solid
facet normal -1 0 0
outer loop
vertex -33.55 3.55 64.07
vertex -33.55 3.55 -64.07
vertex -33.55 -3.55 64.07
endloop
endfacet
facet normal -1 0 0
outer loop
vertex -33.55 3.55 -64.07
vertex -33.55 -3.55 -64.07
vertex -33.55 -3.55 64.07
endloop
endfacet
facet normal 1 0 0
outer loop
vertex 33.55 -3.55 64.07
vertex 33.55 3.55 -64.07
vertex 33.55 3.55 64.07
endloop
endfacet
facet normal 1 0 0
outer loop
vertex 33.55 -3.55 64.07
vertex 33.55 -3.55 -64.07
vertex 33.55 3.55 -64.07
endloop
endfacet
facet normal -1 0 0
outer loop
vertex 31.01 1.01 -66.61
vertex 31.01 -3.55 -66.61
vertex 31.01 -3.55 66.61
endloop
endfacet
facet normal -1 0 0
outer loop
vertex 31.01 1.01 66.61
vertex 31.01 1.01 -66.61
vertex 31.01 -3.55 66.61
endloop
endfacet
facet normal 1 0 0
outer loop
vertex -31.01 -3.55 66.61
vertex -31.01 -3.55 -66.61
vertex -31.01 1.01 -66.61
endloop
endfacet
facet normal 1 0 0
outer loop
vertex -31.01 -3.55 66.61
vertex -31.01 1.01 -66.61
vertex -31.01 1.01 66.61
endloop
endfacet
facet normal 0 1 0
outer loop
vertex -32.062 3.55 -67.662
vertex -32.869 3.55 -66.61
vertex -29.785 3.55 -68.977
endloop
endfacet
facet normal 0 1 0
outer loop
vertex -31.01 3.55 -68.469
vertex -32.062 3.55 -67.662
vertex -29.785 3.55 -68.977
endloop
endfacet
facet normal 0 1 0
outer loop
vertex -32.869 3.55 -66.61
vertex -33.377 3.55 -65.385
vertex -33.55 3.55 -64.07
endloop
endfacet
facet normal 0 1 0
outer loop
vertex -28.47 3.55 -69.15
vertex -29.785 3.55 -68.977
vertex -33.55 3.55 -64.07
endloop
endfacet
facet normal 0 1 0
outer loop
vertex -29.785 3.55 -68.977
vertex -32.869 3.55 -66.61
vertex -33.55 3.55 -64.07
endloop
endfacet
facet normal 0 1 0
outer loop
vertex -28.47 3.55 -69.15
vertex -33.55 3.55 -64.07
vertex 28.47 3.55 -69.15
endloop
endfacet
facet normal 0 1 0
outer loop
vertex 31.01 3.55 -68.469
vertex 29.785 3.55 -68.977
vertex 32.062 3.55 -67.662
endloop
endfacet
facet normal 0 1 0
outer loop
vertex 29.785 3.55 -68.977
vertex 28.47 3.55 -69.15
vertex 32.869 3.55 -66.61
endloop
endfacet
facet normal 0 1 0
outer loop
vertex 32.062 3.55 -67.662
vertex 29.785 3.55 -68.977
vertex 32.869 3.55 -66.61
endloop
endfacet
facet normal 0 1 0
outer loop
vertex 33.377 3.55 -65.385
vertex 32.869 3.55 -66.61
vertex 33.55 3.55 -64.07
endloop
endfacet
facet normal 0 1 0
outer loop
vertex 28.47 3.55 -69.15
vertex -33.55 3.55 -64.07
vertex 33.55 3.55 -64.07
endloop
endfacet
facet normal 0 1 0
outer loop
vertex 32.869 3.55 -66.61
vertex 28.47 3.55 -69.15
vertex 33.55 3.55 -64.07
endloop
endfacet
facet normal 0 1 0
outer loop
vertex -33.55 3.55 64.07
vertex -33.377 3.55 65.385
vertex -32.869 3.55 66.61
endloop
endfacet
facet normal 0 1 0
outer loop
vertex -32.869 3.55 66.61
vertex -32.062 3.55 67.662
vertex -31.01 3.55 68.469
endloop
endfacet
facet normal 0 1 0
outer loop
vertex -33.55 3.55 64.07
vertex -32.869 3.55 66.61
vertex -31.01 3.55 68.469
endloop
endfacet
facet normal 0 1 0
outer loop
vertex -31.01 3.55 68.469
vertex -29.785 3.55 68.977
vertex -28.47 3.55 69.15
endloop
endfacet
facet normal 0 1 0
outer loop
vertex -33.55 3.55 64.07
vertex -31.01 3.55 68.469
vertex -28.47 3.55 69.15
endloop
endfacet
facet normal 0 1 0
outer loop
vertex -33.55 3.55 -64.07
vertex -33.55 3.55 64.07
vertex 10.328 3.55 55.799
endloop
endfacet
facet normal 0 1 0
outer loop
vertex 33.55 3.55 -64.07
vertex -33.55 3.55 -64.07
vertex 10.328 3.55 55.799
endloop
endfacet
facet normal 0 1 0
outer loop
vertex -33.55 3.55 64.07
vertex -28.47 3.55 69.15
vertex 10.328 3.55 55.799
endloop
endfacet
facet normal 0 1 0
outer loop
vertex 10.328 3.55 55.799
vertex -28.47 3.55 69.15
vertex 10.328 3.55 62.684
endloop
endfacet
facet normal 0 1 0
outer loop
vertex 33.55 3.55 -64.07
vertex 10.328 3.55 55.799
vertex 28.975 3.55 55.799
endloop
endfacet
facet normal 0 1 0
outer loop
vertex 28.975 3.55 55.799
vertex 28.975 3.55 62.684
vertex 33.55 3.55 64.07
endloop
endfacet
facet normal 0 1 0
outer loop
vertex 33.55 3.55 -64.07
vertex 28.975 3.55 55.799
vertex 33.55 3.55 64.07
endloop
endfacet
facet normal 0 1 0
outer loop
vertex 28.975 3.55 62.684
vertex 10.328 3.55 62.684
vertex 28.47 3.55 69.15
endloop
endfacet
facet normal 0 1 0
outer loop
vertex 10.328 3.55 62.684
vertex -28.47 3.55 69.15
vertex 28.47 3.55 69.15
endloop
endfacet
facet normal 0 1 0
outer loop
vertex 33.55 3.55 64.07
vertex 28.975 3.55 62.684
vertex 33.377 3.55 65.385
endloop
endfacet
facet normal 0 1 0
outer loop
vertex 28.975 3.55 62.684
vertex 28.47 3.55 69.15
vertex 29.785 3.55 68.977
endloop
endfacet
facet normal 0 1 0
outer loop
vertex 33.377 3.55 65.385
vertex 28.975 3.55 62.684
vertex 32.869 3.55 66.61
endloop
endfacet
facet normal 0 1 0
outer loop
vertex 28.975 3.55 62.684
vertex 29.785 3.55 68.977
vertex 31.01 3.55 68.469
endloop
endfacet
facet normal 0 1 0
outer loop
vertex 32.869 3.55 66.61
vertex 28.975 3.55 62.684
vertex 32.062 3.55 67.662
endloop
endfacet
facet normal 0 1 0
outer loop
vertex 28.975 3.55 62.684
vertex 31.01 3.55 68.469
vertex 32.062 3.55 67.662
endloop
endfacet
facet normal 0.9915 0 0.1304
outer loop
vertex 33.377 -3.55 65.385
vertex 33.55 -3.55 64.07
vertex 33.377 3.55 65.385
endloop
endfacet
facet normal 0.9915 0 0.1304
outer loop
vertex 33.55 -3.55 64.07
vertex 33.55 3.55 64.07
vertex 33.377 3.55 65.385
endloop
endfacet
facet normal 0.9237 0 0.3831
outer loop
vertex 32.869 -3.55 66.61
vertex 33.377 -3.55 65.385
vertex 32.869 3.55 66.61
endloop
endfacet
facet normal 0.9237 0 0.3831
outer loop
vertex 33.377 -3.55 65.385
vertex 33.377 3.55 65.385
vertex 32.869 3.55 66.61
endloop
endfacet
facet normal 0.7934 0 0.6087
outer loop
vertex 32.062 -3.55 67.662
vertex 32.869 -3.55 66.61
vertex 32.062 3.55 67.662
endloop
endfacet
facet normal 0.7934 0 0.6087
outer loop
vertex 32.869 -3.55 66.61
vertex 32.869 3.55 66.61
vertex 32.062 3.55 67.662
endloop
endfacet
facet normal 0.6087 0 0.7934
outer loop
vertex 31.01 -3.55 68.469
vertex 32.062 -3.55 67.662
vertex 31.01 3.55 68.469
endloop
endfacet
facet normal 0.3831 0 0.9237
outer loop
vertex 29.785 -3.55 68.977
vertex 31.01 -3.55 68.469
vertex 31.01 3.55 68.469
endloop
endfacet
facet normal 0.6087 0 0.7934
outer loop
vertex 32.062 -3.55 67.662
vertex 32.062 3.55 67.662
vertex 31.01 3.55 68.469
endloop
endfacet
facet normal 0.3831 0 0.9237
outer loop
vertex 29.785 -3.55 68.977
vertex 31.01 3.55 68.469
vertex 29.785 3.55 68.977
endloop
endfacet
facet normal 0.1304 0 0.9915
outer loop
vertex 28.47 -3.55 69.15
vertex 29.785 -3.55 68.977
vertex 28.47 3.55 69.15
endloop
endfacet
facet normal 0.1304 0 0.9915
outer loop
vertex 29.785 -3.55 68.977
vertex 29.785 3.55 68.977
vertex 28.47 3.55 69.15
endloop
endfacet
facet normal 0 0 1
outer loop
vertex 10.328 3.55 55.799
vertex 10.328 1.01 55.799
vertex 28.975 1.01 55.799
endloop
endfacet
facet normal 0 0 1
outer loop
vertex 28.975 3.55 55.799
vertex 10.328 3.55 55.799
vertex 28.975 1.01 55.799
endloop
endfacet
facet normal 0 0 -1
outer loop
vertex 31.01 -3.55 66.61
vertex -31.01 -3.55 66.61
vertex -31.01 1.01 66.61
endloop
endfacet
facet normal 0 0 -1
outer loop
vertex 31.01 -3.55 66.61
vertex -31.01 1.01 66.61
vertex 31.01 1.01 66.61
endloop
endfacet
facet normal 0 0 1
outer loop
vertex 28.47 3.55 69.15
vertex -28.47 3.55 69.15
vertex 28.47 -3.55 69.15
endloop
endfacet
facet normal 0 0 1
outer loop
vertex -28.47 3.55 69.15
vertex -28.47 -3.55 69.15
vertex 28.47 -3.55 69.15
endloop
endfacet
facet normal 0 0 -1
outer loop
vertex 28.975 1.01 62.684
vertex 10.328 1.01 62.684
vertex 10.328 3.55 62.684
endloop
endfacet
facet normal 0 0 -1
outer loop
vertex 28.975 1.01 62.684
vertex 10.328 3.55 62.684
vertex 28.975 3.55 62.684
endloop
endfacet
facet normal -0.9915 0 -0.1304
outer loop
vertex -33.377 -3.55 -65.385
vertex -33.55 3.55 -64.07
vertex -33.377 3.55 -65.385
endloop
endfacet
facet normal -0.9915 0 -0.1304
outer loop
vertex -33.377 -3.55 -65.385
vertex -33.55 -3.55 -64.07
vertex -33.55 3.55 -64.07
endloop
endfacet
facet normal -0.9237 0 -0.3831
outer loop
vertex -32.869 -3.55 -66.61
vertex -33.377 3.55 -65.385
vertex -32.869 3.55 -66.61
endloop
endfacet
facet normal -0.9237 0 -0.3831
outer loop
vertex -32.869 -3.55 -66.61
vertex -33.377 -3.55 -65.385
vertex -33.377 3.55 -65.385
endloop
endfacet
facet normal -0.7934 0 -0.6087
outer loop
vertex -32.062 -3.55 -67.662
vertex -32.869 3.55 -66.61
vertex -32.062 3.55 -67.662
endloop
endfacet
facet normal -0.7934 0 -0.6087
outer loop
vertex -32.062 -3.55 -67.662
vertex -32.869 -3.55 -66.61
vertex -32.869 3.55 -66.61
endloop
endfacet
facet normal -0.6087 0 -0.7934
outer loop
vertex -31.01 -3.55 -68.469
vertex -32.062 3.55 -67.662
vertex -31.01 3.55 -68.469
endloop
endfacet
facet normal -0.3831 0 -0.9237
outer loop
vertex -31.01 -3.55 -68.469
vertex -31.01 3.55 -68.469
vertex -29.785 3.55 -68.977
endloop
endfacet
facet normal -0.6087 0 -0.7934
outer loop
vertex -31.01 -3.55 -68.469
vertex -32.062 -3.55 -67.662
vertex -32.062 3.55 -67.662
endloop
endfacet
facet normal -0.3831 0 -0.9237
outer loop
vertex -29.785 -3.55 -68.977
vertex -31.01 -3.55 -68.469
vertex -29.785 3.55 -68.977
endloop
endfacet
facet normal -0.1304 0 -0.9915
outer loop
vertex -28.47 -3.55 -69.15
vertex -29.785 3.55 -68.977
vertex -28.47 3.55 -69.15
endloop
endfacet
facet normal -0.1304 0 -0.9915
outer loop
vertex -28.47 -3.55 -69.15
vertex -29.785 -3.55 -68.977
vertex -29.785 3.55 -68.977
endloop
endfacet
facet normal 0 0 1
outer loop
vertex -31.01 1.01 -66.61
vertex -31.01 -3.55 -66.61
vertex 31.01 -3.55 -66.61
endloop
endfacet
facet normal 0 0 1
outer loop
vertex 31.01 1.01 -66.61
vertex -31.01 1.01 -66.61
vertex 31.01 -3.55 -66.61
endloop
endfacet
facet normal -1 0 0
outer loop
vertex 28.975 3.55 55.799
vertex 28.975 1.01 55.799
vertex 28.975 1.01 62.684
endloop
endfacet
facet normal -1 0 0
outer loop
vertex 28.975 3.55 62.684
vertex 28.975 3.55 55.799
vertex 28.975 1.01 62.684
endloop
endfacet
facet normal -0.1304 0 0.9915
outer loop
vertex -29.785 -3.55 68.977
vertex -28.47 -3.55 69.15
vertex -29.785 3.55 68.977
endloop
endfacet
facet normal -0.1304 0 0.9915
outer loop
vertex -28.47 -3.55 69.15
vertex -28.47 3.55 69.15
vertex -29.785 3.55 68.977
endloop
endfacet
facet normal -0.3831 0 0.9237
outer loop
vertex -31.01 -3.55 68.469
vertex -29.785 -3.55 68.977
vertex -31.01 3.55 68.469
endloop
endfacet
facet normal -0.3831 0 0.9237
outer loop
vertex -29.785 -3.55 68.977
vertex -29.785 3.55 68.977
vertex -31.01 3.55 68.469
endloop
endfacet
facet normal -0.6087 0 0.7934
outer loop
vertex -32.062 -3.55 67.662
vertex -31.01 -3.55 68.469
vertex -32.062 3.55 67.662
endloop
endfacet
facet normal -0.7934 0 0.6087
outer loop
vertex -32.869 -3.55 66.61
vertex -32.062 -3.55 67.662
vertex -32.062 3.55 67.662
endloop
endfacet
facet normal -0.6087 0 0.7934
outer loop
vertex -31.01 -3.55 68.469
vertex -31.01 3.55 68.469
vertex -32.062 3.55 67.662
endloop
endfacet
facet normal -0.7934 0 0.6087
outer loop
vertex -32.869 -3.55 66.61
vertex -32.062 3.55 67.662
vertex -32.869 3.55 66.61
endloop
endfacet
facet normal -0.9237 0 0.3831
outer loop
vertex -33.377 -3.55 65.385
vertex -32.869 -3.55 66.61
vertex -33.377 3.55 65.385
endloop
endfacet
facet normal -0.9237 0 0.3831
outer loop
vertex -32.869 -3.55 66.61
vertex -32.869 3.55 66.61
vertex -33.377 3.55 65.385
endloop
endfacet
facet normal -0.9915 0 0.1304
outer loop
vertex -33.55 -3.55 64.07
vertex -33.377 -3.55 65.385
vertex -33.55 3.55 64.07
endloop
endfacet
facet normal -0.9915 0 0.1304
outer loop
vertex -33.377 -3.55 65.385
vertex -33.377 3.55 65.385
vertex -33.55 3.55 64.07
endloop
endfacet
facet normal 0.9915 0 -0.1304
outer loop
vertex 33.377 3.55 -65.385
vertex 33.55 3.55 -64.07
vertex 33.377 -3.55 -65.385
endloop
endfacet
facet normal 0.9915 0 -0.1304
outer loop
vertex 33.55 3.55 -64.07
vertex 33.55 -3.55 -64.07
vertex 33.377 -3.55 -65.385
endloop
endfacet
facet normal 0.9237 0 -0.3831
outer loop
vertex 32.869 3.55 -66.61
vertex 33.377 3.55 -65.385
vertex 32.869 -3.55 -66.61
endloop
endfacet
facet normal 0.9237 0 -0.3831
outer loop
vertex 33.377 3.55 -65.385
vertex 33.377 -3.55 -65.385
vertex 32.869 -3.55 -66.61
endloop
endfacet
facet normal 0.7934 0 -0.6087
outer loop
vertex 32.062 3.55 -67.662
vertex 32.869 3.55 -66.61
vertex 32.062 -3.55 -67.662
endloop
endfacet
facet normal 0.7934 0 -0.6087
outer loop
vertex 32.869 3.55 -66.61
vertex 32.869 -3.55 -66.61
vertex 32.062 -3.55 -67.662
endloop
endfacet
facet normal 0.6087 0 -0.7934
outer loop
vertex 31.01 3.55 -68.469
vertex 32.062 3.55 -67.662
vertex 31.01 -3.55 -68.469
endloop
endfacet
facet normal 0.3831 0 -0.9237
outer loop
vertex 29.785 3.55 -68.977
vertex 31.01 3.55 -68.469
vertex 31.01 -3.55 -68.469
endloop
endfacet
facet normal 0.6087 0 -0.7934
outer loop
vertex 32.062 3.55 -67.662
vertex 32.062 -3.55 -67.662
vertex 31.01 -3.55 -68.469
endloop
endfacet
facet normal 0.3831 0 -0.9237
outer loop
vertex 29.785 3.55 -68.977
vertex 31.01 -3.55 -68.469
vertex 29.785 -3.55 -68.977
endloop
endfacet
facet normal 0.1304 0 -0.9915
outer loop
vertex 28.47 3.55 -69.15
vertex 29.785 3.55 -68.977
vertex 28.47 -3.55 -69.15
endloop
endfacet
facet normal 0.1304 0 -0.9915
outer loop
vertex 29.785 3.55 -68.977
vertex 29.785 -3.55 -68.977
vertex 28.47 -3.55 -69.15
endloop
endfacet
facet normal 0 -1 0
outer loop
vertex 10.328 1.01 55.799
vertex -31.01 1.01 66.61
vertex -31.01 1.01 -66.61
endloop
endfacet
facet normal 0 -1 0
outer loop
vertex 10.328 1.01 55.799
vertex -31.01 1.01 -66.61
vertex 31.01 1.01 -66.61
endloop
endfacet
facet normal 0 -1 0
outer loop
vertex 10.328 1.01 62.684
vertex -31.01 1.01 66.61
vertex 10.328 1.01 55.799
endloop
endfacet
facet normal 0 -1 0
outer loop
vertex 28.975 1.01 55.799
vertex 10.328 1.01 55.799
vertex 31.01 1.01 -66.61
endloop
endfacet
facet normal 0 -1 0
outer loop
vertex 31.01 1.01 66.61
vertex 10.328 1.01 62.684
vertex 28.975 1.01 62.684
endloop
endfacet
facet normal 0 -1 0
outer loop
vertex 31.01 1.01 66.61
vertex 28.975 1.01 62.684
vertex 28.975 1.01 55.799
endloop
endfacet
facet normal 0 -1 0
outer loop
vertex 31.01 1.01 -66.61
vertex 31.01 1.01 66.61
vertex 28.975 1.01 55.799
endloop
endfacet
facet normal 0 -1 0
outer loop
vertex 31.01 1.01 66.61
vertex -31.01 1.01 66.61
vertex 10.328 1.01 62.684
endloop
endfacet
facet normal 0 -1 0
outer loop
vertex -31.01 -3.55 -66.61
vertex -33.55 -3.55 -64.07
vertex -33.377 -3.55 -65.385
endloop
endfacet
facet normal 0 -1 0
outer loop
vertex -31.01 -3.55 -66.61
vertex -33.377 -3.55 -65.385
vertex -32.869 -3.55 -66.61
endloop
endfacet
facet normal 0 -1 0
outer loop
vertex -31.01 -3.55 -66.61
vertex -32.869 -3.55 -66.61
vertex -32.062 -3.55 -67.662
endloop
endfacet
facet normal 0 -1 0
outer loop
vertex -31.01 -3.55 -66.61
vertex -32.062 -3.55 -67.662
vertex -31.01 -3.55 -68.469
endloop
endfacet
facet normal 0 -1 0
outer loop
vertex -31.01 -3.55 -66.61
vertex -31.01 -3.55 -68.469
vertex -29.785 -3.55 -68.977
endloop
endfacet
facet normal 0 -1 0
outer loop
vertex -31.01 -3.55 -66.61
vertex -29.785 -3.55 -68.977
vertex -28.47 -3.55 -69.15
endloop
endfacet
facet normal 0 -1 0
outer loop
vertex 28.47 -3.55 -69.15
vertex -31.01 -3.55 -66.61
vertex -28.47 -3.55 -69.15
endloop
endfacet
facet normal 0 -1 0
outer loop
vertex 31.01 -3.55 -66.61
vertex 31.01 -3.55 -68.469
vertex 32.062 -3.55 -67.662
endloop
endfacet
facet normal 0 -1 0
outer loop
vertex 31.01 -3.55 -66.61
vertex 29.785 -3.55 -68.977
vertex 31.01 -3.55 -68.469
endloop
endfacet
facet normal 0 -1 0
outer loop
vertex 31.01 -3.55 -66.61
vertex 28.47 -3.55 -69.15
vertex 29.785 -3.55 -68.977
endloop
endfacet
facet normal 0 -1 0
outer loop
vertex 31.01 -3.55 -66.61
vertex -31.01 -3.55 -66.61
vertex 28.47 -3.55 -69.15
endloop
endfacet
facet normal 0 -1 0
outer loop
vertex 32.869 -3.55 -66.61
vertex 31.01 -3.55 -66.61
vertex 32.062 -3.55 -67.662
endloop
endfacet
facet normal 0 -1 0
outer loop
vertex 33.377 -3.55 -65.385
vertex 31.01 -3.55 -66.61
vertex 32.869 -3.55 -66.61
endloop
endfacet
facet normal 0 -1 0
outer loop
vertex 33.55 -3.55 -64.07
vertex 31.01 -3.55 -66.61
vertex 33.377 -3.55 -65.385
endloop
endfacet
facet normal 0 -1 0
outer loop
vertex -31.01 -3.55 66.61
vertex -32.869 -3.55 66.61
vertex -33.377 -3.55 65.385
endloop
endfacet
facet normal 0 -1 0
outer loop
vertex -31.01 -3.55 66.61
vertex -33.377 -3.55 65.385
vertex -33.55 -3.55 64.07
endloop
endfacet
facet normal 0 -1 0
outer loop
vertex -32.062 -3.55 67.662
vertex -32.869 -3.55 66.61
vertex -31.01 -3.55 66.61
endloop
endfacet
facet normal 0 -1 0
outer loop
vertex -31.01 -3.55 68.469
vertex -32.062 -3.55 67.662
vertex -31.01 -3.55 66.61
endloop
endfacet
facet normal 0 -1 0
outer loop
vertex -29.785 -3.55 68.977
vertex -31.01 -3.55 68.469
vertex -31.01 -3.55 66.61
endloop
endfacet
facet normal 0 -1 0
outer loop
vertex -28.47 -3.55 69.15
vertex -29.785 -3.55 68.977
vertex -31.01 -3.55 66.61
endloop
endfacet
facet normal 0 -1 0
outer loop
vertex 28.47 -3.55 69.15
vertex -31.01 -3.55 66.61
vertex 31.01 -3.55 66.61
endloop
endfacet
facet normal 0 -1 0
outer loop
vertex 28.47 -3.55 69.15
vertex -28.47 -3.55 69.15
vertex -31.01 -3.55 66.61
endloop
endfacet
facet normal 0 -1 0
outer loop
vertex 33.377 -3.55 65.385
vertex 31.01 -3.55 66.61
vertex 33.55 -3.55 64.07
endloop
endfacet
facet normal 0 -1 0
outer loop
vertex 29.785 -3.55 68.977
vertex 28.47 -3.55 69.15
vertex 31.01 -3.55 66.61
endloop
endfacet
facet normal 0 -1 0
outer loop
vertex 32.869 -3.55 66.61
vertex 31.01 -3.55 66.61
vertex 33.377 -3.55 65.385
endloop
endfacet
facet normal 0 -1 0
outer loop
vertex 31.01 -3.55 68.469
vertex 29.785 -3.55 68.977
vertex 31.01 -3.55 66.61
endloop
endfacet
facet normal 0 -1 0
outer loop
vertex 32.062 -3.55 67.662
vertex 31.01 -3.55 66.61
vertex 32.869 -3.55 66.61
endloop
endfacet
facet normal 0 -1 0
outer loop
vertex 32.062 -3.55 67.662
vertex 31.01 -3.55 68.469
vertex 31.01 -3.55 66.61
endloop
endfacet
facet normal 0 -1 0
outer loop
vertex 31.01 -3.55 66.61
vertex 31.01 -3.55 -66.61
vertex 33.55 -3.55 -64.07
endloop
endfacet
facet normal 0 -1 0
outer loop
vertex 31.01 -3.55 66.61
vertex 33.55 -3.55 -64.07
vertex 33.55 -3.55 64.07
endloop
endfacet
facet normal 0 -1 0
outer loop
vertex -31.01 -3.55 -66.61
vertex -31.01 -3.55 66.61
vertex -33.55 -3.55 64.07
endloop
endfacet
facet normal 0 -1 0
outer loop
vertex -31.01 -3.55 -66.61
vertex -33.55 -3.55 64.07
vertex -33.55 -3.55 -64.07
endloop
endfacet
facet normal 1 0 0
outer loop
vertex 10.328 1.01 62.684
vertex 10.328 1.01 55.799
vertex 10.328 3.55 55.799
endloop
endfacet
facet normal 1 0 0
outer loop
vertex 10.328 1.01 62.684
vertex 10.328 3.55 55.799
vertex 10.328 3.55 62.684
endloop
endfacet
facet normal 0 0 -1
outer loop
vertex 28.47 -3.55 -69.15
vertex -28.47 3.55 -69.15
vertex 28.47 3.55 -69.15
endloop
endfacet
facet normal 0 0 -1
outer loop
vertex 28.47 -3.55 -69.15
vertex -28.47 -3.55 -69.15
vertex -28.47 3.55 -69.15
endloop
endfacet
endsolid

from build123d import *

# Parameters (mm, degrees)
F0_W     = 67.1
F0_H     = 138.3
F1_DEPTH = 3.55
F2_T     = -2.54
F3_R     = 5.08
F4_W     = 18.64754
F4_H     = 6.885249
F5_DEPTH = 12.5


with BuildPart() as f1:
    # F0 (on Front) → F1 (new body, symmetric)
    with BuildSketch(Plane.XZ):
        Rectangle(F0_W, F0_H)
    extrude(amount=F1_DEPTH, both=True)

    # F2
    f2_openings = [f1.faces().sort_by_distance(p)[0] for p in [
        (0, -3.55, 0),
    ]]
    offset(amount=F2_T, openings=f2_openings)

    # F3
    f3_edges = [f1.edges().sort_by_distance(p)[0] for p in [
        (33.55, 0, 69.15),
        (-33.55, 0, 69.15),
        (-33.55, 0, -69.15),
        (33.55, 0, -69.15),
    ]]
    fillet(f3_edges, radius=F3_R)

    # F4 (on Front) → F5 (cut, symmetric)
    with BuildSketch(Plane.XZ):
        with Locations((19.651639, 59.241807)):
            Rectangle(F4_W, F4_H)
    extrude(amount=F5_DEPTH, both=True, mode=Mode.SUBTRACT)


solid = f1.part
